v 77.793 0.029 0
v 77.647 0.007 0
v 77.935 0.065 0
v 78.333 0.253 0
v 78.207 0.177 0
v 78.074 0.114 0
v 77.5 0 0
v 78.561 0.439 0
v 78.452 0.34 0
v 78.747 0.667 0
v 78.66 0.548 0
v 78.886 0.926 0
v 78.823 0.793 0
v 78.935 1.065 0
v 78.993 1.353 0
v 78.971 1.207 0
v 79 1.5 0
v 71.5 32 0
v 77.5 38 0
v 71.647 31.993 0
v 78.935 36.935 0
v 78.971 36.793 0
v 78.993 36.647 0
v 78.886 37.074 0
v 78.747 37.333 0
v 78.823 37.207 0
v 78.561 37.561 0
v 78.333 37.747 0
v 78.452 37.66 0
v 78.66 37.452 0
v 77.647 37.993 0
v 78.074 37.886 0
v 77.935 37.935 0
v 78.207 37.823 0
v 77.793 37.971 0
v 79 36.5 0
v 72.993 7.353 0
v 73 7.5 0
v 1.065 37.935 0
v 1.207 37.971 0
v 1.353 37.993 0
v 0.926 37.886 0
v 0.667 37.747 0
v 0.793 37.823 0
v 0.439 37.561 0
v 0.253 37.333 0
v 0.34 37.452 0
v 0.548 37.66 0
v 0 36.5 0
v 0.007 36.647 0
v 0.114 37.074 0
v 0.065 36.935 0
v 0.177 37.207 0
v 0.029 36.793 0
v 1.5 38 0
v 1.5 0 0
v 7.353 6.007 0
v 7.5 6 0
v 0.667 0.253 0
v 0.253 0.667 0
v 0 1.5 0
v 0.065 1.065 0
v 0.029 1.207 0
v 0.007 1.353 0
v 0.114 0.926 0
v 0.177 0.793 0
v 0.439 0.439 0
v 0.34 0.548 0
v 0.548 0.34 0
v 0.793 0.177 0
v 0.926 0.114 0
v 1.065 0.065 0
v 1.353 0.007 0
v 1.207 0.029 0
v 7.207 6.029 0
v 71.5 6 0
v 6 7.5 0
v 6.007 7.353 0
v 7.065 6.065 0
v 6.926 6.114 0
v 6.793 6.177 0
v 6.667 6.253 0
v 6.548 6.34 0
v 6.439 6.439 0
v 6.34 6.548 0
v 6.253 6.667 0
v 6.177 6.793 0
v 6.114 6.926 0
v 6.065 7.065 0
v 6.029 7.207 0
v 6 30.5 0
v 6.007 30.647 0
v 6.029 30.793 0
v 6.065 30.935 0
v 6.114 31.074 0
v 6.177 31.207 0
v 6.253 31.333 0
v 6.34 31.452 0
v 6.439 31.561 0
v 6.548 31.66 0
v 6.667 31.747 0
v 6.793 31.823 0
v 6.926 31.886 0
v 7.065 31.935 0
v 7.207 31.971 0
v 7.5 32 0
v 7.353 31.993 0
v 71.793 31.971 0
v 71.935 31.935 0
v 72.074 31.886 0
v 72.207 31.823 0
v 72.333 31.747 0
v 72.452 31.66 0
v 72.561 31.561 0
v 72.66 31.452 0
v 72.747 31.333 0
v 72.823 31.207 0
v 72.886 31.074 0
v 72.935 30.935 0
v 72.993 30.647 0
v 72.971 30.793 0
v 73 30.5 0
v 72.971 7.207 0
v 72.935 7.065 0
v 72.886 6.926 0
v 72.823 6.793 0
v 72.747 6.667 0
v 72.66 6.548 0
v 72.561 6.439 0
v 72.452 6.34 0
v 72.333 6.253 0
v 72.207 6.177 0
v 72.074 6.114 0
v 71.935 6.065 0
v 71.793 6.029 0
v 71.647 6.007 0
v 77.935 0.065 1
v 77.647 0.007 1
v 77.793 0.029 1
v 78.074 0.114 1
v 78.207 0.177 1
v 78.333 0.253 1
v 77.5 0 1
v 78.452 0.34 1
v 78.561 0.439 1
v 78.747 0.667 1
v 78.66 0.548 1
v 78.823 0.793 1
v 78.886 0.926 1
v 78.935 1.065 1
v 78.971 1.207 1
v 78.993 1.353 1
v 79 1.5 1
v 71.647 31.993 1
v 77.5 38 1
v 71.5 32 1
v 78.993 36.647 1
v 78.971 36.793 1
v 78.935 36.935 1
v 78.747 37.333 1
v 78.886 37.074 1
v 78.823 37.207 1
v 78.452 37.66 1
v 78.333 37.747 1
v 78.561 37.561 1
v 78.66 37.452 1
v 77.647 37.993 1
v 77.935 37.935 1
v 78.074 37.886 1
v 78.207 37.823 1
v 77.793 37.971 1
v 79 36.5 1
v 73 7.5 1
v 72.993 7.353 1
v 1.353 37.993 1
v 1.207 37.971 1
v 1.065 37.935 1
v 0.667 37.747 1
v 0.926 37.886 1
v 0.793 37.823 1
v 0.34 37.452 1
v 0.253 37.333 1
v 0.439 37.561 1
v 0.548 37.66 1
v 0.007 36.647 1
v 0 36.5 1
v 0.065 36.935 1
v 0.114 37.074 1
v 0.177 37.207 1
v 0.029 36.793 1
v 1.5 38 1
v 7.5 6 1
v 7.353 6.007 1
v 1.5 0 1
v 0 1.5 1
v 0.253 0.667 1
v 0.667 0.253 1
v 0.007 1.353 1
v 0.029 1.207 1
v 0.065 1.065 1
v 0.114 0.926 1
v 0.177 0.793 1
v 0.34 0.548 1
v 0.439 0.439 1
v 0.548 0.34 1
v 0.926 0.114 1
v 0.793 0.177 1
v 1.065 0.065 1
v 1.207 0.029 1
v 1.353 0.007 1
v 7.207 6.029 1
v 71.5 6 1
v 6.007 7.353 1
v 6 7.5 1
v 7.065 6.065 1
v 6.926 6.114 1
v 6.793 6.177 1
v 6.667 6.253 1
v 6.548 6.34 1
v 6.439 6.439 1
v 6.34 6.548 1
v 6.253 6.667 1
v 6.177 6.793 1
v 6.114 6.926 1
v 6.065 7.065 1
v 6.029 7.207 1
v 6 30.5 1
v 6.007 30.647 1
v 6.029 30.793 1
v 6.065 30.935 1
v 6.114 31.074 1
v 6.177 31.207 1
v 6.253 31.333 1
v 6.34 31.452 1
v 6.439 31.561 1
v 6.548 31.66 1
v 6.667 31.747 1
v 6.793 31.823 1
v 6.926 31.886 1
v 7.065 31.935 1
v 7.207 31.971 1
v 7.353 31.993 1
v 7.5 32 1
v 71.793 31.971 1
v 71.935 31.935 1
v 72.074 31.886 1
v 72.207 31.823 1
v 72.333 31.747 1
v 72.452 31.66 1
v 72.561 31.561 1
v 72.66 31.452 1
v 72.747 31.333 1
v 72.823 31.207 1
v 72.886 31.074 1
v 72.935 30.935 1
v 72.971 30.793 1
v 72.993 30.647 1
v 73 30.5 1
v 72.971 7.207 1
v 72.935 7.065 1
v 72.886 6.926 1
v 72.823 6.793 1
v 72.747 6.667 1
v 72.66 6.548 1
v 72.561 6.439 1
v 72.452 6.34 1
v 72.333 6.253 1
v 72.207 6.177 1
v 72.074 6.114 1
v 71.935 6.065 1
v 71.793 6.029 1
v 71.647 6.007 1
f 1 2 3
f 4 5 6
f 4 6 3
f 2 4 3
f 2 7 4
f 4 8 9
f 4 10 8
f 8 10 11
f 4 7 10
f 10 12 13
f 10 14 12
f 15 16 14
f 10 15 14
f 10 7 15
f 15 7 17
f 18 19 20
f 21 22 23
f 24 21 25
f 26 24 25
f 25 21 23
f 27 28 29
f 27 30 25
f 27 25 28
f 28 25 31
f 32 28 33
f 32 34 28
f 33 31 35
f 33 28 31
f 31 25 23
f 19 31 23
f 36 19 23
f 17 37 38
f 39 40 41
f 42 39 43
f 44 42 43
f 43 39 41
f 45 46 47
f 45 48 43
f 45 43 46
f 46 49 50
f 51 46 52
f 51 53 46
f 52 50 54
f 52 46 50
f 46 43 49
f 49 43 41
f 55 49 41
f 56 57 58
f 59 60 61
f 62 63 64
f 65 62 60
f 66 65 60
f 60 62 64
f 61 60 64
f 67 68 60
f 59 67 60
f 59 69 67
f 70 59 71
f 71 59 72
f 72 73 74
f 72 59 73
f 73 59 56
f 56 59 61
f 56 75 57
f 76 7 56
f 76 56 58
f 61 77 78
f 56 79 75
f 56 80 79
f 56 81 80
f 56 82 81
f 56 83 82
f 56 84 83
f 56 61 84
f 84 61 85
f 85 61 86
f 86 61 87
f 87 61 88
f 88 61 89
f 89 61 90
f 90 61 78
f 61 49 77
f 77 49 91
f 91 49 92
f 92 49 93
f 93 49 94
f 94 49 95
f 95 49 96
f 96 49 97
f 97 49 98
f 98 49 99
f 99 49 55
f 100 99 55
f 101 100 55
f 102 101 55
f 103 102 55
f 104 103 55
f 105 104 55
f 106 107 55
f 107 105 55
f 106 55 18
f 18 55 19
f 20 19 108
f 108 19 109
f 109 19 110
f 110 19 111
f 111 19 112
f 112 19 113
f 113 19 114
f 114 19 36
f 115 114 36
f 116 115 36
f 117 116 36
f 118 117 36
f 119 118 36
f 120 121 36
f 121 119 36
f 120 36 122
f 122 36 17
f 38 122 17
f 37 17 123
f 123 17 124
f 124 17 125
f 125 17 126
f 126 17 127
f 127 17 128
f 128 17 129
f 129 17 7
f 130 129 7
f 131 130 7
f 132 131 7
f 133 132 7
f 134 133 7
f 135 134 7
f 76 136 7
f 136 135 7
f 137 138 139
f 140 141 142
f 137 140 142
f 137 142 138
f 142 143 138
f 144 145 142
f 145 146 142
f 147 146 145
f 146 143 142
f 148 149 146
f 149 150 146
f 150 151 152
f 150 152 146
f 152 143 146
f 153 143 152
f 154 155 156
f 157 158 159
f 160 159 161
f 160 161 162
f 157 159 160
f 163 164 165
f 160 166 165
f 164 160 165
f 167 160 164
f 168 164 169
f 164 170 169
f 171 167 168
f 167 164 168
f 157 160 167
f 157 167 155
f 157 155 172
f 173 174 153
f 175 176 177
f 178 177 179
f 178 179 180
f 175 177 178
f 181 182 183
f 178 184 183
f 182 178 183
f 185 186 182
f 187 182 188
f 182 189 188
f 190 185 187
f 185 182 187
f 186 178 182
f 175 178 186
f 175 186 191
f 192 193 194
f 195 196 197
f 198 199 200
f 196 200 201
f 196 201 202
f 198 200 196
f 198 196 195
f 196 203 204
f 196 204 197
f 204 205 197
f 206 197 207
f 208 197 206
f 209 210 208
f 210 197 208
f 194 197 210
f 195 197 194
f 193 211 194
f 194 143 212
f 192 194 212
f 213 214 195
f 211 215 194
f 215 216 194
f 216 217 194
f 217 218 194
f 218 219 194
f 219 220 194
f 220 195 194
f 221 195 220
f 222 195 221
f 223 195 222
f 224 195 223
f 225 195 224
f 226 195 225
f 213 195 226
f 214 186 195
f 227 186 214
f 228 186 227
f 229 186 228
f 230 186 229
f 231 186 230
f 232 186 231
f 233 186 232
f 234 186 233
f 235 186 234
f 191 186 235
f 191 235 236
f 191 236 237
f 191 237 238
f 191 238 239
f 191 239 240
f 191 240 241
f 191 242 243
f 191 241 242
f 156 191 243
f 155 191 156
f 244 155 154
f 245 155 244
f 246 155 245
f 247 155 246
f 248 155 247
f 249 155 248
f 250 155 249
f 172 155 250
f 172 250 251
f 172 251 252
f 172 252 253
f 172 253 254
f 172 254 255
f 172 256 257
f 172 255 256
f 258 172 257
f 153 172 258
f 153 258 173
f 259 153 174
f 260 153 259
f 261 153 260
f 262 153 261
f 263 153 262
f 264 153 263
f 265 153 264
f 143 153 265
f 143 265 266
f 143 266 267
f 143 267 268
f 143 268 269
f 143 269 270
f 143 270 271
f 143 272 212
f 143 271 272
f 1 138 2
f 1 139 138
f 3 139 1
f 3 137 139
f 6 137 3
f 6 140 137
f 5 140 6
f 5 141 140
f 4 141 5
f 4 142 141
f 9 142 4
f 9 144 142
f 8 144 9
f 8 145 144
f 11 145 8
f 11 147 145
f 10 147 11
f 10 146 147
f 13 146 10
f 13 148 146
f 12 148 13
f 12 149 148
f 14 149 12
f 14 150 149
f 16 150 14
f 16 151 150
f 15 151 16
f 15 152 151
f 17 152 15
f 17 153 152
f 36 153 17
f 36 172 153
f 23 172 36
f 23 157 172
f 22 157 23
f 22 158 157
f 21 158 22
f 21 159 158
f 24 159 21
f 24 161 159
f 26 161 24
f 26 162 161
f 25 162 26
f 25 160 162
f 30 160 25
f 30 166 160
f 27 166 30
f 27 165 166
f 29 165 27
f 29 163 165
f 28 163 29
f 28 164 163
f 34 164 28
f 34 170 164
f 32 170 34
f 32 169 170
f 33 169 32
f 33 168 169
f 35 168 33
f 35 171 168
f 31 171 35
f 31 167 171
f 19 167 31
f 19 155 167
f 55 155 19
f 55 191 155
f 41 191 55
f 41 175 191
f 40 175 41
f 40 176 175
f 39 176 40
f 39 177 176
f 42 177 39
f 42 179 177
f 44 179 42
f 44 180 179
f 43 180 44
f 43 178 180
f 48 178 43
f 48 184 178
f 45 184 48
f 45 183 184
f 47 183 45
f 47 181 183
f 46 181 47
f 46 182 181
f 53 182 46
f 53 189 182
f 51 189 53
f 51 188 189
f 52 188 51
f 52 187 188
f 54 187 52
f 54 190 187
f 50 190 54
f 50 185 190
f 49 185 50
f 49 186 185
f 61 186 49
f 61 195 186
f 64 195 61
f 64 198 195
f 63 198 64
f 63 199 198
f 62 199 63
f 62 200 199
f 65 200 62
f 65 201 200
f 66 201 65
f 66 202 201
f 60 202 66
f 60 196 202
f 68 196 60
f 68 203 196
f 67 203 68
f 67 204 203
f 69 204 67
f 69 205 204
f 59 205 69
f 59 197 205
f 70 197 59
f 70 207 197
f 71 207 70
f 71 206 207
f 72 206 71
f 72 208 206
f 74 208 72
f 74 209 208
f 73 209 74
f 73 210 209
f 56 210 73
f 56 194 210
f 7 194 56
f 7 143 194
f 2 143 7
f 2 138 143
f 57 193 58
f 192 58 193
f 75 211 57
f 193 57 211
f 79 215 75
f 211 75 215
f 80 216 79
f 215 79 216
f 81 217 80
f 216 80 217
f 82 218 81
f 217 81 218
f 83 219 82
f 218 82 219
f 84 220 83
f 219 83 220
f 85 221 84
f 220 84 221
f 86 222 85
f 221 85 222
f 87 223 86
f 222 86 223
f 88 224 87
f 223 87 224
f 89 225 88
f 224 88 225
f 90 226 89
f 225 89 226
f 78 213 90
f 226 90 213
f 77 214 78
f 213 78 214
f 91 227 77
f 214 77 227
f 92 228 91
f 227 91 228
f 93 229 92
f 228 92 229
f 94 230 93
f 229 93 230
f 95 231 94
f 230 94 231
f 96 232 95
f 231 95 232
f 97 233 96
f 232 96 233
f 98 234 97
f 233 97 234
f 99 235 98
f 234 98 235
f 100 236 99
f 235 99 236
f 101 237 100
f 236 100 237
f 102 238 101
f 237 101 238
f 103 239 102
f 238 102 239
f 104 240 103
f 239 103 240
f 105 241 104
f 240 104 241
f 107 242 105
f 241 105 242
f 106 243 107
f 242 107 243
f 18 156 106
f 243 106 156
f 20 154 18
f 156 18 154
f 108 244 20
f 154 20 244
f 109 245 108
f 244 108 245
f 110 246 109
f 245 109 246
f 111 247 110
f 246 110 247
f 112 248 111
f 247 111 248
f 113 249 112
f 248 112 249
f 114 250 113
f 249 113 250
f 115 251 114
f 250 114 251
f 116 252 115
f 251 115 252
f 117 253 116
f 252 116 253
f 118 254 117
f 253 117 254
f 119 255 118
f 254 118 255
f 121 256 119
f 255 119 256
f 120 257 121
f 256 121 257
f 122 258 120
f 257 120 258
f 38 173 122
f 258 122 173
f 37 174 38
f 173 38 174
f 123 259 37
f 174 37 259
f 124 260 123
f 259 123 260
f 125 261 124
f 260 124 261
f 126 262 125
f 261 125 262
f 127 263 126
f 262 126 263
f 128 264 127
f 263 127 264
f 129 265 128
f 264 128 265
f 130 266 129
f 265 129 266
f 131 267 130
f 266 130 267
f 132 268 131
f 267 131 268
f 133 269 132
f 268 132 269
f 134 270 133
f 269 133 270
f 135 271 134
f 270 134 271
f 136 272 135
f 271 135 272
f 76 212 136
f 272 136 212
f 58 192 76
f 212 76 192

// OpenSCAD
// file: ymse.scad
// ymse.scad
//
// Ymse: Norwegian word, ['ymsɘ], meaning "diverse" or "various")
// Written by Roy Sigurd Karlsbakk <roy@karlsbakk.net>

// Bloody OpenSCAD has no idea about what a global variable might be and
// noone seems to care, but functions work.
function pi() =  3.141592653589793;

// Colours - all in RGB, as to be passed to rgb()
function c_red() = "#ff0000";
function c_orange() = "#ff8000";
function c_yellow() = "#ffff00";
function c_green() = "#00ff00";
function c_blue() = "#0000ff";
function c_indigo() = "#4b0082"; // '75, 0, 130';
function c_purple() = "#ff00ff";

// Various modules

/*
 * rgb(), like color(), except it takes an array of values 0-255,
 * resembling the values used in HTML/CSS/etc. For example: 
 *
 * rgb([0x80, 0x40, 0xff]) cube([10,10,10]);
 */
module rgb(colour) {
    color(colour/255) {
        children();
    }
}

module roundedsquare(size, radius) {
    if (radius == 0) {
        square(size);
    } else {
        hull() {
            translate([radius, radius]) {
                circle(r=radius);
            }
            translate([size[0]-radius, radius]) {
                circle(r=radius);
            }
            translate([radius, size[1]-radius]) {
                circle(r=radius);
            }
            translate([size[0]-radius, size[1]-radius]) {
                circle(r=radius);
            }
        }
    }
}

module roundedcube(size, radius) {
    if (radius == 0) {
        cube(size);
    } else {
        translate([radius,radius,radius]) {
            hull() {
                for (z = [0, size[2]-radius*2]) {
                    translate([0, 0, z]) {
                        sphere(r=radius);
                    }
                    translate([size[0]-radius*2, 0, z]) {
                        sphere(r=radius);
                    }
                    translate([0, size[1]-radius*2, z]) {
                        sphere(r=radius);
                    }
                    translate([size[0]-radius*2, size[1]-radius*2, z]) {
                        sphere(r=radius);
                    }
                }
            }
        }
    }
}

// r[adius], h[eight], [rou]n[d]
// roundedcylinder(r=10,h=30,n=.5,$fn=200);
module roundedcylinder(r,h,n) {
    rotate_extrude(convexity=1) {
        offset(r=n) {
            offset(delta=-n) {
                square([r,h]);
            }
        }
        square([n,h]);
    }
}


module flat_heart(size) {
    intsize = size/pi*2;
    rotate([0,0,45]) {
        square(intsize);
        translate([intsize/2, intsize, 0]) {
            circle(intsize/2, $fn=32);
        }

        translate([intsize, intsize/2, 0]) {
            circle(intsize/2, $fn=32);
        }
    }
}

module ramme(size, border=1) {
    difference() {
        square(size);
        translate([border,border]) {
            square([size[0]-border*2,size[1]-border*2]);
        }
    }
}

module skruehull(diameter, lengde, innsenkning = 0) {
    cylinder(d = diameter, h = lengde);
    if (innsenkning != 0) {
        translate([0, 0, lengde-innsenkning]) {
            cylinder(h=innsenkning, d1=diameter, d2=diameter+innsenkning);
        }
    }
}

// Warn users including this with 'include' without knowing better
assert("Don't 'include' this if you just want to use its modules etc. Better 'use' it.");

//roundedcube([40,40,10], 2, $fn=16);
/*
// lalalatest
linear_extrude(height = 13)
    flat_heart(27);
*/

//flat_heart(10);

// a:angle, r:radius, h:height
module pie_slice(a, r, h){
  rotate_extrude(angle=a) {
    square([r,h]);
  }
}
// main file
include <ymse.scad>

w=73;
h=32;
t=4;
tb=1;
kt=1.5;
br=2;
r=1.5;
uw=8;
uh=3;
ur=0.35;
ufw=16;
ufd=11.5;
brem=3;

linear_extrude(1) {
    difference() {
        roundedsquare([w+brem*2,h+brem*2], r, $fn=64);
        translate([brem*2,brem*2])
            roundedsquare([w-brem*2,h-brem*2], r, $fn=64);
    }
}
